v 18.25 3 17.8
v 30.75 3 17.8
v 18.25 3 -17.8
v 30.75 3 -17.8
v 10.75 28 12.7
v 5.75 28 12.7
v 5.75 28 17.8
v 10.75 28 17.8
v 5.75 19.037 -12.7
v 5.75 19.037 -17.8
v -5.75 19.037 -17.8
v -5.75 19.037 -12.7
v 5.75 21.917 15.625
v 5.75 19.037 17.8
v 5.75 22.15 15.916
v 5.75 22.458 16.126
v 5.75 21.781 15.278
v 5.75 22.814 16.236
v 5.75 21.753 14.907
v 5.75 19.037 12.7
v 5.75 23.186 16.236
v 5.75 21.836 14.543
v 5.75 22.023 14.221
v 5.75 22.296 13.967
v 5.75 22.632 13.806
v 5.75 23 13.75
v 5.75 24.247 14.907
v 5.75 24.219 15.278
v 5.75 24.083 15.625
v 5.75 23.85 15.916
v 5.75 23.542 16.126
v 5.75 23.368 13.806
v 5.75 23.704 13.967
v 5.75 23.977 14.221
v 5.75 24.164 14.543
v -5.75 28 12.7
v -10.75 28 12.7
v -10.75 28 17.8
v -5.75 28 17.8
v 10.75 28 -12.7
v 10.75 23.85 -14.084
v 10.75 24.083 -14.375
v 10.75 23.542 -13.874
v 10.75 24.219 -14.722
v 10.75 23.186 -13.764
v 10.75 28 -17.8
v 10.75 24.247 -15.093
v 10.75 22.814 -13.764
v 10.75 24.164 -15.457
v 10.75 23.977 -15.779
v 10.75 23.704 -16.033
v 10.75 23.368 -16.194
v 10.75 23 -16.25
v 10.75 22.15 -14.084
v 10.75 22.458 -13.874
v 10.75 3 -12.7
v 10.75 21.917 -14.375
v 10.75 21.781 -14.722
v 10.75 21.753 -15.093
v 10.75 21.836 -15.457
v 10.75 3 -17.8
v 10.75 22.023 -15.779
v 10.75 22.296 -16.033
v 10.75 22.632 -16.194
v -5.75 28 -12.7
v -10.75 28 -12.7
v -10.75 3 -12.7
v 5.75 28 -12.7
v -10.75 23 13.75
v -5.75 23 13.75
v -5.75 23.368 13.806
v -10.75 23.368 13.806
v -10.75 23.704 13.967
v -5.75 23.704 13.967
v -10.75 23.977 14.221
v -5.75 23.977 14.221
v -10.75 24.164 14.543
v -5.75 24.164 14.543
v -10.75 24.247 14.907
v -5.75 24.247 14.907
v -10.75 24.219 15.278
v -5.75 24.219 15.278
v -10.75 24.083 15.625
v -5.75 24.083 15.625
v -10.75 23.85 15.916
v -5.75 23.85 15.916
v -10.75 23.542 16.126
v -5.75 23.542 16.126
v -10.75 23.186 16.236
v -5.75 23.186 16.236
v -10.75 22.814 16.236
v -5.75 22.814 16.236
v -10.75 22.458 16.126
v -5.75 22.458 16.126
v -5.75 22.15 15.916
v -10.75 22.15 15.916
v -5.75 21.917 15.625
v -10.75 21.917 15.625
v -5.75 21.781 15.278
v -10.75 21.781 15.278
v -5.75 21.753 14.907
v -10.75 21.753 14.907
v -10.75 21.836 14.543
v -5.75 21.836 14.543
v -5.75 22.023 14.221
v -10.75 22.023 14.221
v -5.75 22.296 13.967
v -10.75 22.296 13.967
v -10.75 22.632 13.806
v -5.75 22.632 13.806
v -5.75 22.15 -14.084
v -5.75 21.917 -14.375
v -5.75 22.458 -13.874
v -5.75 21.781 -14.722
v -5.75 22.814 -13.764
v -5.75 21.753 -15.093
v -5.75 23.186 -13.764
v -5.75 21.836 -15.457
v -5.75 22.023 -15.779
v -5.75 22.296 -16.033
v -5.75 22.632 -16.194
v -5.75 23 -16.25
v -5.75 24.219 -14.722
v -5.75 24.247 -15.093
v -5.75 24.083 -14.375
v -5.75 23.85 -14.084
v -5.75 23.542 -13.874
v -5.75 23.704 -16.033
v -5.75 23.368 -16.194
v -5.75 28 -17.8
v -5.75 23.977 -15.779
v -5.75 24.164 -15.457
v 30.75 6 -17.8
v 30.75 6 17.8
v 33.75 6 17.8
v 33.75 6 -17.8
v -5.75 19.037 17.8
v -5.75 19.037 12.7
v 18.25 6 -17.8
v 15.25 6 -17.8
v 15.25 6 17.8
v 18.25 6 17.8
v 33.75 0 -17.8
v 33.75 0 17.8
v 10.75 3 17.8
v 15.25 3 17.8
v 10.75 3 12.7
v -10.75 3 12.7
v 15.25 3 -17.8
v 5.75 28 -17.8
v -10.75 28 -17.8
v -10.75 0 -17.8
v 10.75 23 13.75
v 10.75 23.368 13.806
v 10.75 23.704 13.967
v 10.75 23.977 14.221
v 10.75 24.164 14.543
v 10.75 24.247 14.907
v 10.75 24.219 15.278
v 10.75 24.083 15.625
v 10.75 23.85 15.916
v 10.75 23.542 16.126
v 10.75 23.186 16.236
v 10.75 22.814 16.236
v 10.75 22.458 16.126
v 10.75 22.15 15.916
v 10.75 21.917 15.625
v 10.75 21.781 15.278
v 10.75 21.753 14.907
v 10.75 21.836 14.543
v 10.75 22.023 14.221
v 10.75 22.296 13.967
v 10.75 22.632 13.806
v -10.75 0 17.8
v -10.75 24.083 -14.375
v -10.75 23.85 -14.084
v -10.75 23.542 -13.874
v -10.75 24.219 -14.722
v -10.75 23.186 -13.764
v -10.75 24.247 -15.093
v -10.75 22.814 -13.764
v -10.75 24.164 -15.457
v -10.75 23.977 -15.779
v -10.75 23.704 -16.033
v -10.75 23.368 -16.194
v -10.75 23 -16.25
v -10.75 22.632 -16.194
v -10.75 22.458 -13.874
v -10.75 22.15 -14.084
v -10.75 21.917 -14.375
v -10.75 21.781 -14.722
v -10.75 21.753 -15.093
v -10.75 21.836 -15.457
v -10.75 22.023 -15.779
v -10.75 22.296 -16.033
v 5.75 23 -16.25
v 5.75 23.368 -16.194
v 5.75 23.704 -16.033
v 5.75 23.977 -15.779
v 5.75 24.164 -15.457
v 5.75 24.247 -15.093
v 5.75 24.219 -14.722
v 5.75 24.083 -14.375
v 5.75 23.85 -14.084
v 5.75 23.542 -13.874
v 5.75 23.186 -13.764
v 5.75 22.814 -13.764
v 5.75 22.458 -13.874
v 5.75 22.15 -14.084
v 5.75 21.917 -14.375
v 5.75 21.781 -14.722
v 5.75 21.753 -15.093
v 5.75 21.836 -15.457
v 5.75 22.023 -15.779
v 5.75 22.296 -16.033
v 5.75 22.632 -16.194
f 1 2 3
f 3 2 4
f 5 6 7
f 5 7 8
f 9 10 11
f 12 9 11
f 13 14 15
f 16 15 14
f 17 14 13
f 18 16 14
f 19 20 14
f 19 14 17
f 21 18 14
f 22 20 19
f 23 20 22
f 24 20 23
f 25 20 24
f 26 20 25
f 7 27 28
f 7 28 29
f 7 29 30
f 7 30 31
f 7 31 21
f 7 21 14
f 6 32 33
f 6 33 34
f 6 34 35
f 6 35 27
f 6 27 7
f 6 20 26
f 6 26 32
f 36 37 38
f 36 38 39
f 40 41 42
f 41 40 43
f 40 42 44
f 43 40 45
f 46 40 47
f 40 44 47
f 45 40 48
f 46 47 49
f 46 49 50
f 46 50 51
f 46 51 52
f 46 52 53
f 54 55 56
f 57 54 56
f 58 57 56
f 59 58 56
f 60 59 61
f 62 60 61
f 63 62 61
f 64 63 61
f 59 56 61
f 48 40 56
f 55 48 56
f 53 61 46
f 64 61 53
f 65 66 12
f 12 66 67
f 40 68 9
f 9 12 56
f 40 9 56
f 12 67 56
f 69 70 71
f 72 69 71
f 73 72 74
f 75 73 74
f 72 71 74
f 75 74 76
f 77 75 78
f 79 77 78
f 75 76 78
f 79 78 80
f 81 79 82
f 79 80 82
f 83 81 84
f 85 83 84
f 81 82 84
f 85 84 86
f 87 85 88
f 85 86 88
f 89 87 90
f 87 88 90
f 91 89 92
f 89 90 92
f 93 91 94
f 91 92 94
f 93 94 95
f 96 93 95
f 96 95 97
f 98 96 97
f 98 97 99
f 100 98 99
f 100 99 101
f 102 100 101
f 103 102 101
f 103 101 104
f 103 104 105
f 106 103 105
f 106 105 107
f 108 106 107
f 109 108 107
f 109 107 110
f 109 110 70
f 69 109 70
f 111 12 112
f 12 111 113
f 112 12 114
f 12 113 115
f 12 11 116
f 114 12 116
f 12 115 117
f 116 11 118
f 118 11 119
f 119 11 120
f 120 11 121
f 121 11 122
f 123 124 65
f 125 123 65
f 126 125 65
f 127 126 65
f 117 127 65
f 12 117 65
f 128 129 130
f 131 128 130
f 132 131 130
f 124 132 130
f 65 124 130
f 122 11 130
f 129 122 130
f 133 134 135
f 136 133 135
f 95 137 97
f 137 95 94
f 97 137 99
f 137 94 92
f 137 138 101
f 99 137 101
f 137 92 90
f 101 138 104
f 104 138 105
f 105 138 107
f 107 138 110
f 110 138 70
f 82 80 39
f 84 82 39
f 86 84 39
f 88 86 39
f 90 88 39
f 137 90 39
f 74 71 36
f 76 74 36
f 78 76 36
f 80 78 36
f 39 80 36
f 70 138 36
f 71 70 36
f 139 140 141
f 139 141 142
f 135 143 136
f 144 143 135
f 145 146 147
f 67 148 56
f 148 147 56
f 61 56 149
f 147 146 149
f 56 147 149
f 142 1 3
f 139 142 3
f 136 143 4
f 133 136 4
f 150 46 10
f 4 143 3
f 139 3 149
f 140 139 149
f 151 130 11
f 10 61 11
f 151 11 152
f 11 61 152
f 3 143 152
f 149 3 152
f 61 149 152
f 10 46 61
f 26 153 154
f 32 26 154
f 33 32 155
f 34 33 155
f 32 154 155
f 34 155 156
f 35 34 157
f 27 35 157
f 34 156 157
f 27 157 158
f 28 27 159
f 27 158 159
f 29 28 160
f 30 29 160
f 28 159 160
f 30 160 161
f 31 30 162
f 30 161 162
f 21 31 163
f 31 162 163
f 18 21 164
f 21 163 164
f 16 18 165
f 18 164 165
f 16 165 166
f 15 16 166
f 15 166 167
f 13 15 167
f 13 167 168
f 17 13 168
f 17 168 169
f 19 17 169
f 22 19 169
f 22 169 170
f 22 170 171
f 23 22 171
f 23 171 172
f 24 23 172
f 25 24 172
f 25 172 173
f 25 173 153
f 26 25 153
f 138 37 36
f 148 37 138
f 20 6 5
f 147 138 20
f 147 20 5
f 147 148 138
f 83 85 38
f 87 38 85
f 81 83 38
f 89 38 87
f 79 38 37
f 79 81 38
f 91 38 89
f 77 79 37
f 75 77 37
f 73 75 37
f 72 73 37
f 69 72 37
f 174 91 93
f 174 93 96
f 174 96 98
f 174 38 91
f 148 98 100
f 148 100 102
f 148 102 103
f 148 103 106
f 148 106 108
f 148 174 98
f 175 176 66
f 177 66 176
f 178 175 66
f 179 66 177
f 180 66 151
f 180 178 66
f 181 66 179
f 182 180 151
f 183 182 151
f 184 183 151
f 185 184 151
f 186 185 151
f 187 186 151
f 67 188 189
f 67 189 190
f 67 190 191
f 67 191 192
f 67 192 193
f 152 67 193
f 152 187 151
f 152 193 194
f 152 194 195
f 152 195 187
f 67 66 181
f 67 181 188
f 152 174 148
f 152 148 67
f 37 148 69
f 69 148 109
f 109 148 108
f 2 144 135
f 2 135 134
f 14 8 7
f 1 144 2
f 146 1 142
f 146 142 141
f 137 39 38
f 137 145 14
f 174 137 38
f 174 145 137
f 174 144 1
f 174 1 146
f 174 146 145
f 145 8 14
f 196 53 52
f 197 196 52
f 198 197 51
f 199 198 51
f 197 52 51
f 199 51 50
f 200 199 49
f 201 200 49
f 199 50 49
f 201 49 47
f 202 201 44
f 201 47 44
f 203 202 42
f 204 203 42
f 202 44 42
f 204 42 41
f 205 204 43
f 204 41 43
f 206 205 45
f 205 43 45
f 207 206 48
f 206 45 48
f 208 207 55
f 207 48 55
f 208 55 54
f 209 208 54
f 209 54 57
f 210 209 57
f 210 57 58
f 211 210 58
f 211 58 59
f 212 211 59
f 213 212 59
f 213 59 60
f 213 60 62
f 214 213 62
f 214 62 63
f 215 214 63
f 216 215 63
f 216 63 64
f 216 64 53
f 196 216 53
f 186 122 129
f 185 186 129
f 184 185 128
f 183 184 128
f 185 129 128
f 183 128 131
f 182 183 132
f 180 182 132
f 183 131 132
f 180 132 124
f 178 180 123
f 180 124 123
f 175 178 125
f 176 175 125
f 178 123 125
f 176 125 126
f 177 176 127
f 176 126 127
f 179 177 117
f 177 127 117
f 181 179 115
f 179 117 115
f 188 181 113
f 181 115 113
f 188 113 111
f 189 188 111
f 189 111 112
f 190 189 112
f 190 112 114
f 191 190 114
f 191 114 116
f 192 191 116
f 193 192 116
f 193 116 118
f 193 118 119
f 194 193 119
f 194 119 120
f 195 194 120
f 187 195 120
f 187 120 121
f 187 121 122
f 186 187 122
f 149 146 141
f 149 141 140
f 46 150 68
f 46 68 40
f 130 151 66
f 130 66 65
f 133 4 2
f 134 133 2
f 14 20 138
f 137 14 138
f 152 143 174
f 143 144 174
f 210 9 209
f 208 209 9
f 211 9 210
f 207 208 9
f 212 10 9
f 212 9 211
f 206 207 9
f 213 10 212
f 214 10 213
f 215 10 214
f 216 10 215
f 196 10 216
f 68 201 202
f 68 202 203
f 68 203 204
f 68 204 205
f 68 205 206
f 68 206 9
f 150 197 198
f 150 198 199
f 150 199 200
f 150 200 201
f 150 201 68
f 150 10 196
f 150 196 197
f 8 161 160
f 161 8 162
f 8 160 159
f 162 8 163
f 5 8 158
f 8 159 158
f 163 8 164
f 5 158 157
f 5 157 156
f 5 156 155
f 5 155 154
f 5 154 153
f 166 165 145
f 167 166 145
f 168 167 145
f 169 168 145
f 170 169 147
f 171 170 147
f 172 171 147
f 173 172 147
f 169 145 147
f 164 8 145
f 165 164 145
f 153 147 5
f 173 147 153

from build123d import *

# Parameters (mm, degrees)
SKETCH1_W           = 36.5
SKETCH1_H           = 35.6
BOSS_EXTRUDE1_DEPTH = 3
SKETCH2_W           = 3
SKETCH2_H           = 5.1
BOSS_EXTRUDE2_DEPTH = 23
SKETCH3_R           = 1.35
CUT_EXTRUDE1_DEPTH  = 37.5
SKETCH4_W           = 35.6
SKETCH4_H           = 3
BOSS_EXTRUDE3_DEPTH = 12.5
SKETCH5_W           = 3
SKETCH5_H           = 35.6
BOSS_EXTRUDE4_DEPTH = 6
SKETCH9_W           = 21.5
SKETCH9_H           = 5.1
BOSS_EXTRUDE6_DEPTH = 25
SKETCH10_R          = 1.25
CUT_EXTRUDE4_DEPTH  = 45.5
SKETCH11_W          = 3
SKETCH11_H          = 23
CUT_EXTRUDE5_DEPTH  = 36.6
SKETCH12_W          = 11.5
SKETCH12_H          = 8.963057692
CUT_EXTRUDE6_DEPTH  = 36.6
SKETCH13_W          = 3
SKETCH13_H          = 35.6
BOSS_EXTRUDE7_DEPTH = 3
SKETCH15_W          = 23
SKETCH15_H          = 35.6
CUT_EXTRUDE9_DEPTH  = 6


with BuildPart() as part:
    # Sketch1 → Boss-Extrude1 (new body)
    with BuildSketch(Plane(origin=(0, 0, 0), x_dir=(1, 0, 0), z_dir=(0, 1, 0))):
        Rectangle(SKETCH1_W, SKETCH1_H)
    extrude(amount=BOSS_EXTRUDE1_DEPTH)

    # Sketch2 → Boss-Extrude2 (add)
    with BuildSketch(Plane(origin=(0, 3, 0), x_dir=(1, 0, 0), z_dir=(0, 1, 0))):
        with Locations((-16.75, 15.25)):
            Rectangle(SKETCH2_W, SKETCH2_H)
        with Locations((-16.75, -15.25)):
            Rectangle(SKETCH2_W, SKETCH2_H)
        with Locations((16.75, 15.25)):
            Rectangle(SKETCH2_W, SKETCH2_H)
        with Locations((16.75, -15.25)):
            Rectangle(SKETCH2_W, SKETCH2_H)
    extrude(amount=BOSS_EXTRUDE2_DEPTH)

    # Sketch3 → Cut-Extrude1 (cut, through all)
    with BuildSketch(Plane(origin=(18.25, 0, 0), x_dir=(0, 0, -1), z_dir=(1, 0, 0))):
        with Locations((-15, 23)):
            Circle(SKETCH3_R)
        with Locations((15, 23)):
            Circle(SKETCH3_R)
    extrude(amount=-CUT_EXTRUDE1_DEPTH, mode=Mode.SUBTRACT)

    # Sketch4 → Boss-Extrude3 (add)
    with BuildSketch(Plane(origin=(18.25, 0, 0), x_dir=(0, 0, -1), z_dir=(1, 0, 0))):
        with Locations((0, 1.5)):
            Rectangle(SKETCH4_W, SKETCH4_H)
    boss_extrude3 = extrude(amount=BOSS_EXTRUDE3_DEPTH)

    # Mirror1: Boss-Extrude3 across plane
    add(boss_extrude3.mirror(Plane(origin=(0, 0, 0), x_dir=(0, 0, 1), z_dir=(1, 0, 0))))

    # Sketch5 → Boss-Extrude4 (add)
    with BuildSketch(Plane.XZ):
        with Locations((32.25, 0)):
            Rectangle(SKETCH5_W, SKETCH5_H)
    boss_extrude4 = extrude(amount=-BOSS_EXTRUDE4_DEPTH)

    # Mirror2: Boss-Extrude4 across plane
    add(boss_extrude4.mirror(Plane(origin=(0, 0, 0), x_dir=(0, 0, 1), z_dir=(1, 0, 0))))

    # Sketch9 → Boss-Extrude6 (add)
    with BuildSketch(Plane(origin=(0, 3, 0), x_dir=(1, 0, 0), z_dir=(0, 1, 0))):
        with Locations((0, 15.25)):
            Rectangle(SKETCH9_W, SKETCH9_H)
        with Locations((0, -15.25)):
            Rectangle(SKETCH9_W, SKETCH9_H)
    extrude(amount=BOSS_EXTRUDE6_DEPTH)

    # Sketch10 → Cut-Extrude4 (cut, through all)
    with BuildSketch(Plane(origin=(10.75, 0, 0), x_dir=(0, 0, -1), z_dir=(1, 0, 0))):
        with Locations((15, 23)):
            Circle(SKETCH10_R)
        with Locations((-15, 23)):
            Circle(SKETCH10_R)
    extrude(amount=-CUT_EXTRUDE4_DEPTH, mode=Mode.SUBTRACT)

    # Sketch11 → Cut-Extrude5 (cut, through all)
    with BuildSketch(Plane(origin=(0, 0, -17.8), x_dir=(-1, 0, 0), z_dir=(0, 0, -1))):
        with Locations((-16.75, 14.5)):
            Rectangle(SKETCH11_W, SKETCH11_H)
        with Locations((16.75, 14.5)):
            Rectangle(SKETCH11_W, SKETCH11_H)
    extrude(amount=-CUT_EXTRUDE5_DEPTH, mode=Mode.SUBTRACT)

    # Sketch12 → Cut-Extrude6 (cut, through all)
    with BuildSketch(Plane(origin=(0, 0, -17.8), x_dir=(-1, 0, 0), z_dir=(0, 0, -1))):
        with Locations((0, 23.518471154)):
            Rectangle(SKETCH12_W, SKETCH12_H)
    extrude(amount=-CUT_EXTRUDE6_DEPTH, mode=Mode.SUBTRACT)

    # Sketch13 → Boss-Extrude7 (add)
    with BuildSketch(Plane(origin=(0, 3, 0), x_dir=(1, 0, 0), z_dir=(0, 1, 0))):
        with Locations((16.75, 0)):
            Rectangle(SKETCH13_W, SKETCH13_H)
    extrude(amount=BOSS_EXTRUDE7_DEPTH)

    # Sketch15 → Cut-Extrude9 (cut)
    with BuildSketch(Plane(origin=(0, 6, 0), x_dir=(1, 0, 0), z_dir=(0, 1, 0))):
        with Locations((-22.25, 0)):
            Rectangle(SKETCH15_W, SKETCH15_H)
    extrude(amount=-CUT_EXTRUDE9_DEPTH, mode=Mode.SUBTRACT)


solid = part.part
